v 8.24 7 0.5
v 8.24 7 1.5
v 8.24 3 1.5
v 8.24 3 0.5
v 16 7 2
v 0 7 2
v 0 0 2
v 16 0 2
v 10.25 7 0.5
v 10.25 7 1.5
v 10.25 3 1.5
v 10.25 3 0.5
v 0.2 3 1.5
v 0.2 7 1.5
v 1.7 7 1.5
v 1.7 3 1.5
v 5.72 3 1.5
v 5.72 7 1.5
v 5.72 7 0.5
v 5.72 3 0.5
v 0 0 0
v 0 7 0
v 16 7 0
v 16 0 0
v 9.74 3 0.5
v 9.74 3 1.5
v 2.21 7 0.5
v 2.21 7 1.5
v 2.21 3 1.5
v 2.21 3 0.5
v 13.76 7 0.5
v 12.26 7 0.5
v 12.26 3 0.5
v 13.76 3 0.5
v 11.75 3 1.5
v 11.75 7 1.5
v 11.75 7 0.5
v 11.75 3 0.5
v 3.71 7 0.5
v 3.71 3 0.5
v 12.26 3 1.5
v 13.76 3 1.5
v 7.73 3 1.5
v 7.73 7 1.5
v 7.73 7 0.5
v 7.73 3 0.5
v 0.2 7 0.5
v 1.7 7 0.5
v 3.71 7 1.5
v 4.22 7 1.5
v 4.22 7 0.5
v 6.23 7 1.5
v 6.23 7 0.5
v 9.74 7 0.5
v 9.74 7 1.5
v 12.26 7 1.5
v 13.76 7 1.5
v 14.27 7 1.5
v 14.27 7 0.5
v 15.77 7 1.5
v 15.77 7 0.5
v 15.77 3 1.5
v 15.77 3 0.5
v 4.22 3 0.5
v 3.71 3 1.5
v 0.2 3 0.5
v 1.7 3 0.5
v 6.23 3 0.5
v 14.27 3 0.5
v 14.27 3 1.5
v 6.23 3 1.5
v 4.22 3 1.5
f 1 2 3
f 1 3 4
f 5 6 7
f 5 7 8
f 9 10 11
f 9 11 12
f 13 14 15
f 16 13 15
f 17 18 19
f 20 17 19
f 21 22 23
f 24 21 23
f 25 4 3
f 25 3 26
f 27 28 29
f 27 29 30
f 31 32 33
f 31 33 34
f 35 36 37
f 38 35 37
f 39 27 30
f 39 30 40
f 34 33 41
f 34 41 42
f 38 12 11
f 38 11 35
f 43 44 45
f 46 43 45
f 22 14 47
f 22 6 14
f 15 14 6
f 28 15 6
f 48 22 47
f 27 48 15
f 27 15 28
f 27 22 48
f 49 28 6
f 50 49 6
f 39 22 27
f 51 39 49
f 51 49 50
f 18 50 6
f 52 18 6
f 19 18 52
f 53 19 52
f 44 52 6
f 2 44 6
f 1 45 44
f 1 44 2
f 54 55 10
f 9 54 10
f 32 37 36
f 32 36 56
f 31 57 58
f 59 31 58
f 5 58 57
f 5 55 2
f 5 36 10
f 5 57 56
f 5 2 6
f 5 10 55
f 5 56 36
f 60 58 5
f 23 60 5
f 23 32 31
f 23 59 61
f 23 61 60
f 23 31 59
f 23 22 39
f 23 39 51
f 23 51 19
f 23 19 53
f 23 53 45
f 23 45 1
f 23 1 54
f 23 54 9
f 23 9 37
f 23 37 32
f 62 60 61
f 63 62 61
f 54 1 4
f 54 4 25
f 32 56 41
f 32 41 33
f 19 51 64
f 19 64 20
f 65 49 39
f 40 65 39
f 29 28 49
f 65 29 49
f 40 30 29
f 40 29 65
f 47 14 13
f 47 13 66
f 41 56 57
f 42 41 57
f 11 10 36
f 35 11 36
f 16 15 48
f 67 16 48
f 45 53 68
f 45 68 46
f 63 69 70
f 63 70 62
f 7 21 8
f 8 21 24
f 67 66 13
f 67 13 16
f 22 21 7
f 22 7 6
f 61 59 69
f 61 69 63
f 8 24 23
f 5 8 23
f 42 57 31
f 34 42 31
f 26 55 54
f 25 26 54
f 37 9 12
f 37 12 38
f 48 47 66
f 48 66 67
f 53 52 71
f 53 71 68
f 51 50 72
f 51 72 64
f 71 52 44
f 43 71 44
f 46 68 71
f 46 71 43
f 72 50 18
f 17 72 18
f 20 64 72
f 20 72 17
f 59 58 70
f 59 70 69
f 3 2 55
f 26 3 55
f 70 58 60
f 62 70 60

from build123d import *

# Parameters (mm, degrees)
SKETCH1_W           = 16
SKETCH1_H           = 7
BOSS_EXTRUDE1_DEPTH = 2
SKETCH2_W           = 1.5
SKETCH2_H           = 1
CUT_EXTRUDE1_DEPTH  = 4
LPATTERN1_COUNT     = 8
LPATTERN1_PITCH     = 2.01


with BuildPart() as part:
    # Sketch1 → Boss-Extrude1 (new body)
    with BuildSketch(Plane.XY):
        with Locations((8, 3.5)):
            Rectangle(SKETCH1_W, SKETCH1_H)
    extrude(amount=BOSS_EXTRUDE1_DEPTH)

    # Sketch2 → Cut-Extrude1 (cut)
    with BuildSketch(Plane(origin=(0, 7, 0), x_dir=(1, 0, 0), z_dir=(0, 1, 0))):
        with Locations((0.95, -1)):
            Rectangle(SKETCH2_W, SKETCH2_H)
    cut_extrude1 = extrude(amount=-CUT_EXTRUDE1_DEPTH, mode=Mode.SUBTRACT)

    # LPattern1: Cut-Extrude1 ×8
    with Locations(*[(i * LPATTERN1_PITCH, 0, 0) for i in range(1, LPATTERN1_COUNT)]):
        add(cut_extrude1, mode=Mode.SUBTRACT)


solid = part.part
